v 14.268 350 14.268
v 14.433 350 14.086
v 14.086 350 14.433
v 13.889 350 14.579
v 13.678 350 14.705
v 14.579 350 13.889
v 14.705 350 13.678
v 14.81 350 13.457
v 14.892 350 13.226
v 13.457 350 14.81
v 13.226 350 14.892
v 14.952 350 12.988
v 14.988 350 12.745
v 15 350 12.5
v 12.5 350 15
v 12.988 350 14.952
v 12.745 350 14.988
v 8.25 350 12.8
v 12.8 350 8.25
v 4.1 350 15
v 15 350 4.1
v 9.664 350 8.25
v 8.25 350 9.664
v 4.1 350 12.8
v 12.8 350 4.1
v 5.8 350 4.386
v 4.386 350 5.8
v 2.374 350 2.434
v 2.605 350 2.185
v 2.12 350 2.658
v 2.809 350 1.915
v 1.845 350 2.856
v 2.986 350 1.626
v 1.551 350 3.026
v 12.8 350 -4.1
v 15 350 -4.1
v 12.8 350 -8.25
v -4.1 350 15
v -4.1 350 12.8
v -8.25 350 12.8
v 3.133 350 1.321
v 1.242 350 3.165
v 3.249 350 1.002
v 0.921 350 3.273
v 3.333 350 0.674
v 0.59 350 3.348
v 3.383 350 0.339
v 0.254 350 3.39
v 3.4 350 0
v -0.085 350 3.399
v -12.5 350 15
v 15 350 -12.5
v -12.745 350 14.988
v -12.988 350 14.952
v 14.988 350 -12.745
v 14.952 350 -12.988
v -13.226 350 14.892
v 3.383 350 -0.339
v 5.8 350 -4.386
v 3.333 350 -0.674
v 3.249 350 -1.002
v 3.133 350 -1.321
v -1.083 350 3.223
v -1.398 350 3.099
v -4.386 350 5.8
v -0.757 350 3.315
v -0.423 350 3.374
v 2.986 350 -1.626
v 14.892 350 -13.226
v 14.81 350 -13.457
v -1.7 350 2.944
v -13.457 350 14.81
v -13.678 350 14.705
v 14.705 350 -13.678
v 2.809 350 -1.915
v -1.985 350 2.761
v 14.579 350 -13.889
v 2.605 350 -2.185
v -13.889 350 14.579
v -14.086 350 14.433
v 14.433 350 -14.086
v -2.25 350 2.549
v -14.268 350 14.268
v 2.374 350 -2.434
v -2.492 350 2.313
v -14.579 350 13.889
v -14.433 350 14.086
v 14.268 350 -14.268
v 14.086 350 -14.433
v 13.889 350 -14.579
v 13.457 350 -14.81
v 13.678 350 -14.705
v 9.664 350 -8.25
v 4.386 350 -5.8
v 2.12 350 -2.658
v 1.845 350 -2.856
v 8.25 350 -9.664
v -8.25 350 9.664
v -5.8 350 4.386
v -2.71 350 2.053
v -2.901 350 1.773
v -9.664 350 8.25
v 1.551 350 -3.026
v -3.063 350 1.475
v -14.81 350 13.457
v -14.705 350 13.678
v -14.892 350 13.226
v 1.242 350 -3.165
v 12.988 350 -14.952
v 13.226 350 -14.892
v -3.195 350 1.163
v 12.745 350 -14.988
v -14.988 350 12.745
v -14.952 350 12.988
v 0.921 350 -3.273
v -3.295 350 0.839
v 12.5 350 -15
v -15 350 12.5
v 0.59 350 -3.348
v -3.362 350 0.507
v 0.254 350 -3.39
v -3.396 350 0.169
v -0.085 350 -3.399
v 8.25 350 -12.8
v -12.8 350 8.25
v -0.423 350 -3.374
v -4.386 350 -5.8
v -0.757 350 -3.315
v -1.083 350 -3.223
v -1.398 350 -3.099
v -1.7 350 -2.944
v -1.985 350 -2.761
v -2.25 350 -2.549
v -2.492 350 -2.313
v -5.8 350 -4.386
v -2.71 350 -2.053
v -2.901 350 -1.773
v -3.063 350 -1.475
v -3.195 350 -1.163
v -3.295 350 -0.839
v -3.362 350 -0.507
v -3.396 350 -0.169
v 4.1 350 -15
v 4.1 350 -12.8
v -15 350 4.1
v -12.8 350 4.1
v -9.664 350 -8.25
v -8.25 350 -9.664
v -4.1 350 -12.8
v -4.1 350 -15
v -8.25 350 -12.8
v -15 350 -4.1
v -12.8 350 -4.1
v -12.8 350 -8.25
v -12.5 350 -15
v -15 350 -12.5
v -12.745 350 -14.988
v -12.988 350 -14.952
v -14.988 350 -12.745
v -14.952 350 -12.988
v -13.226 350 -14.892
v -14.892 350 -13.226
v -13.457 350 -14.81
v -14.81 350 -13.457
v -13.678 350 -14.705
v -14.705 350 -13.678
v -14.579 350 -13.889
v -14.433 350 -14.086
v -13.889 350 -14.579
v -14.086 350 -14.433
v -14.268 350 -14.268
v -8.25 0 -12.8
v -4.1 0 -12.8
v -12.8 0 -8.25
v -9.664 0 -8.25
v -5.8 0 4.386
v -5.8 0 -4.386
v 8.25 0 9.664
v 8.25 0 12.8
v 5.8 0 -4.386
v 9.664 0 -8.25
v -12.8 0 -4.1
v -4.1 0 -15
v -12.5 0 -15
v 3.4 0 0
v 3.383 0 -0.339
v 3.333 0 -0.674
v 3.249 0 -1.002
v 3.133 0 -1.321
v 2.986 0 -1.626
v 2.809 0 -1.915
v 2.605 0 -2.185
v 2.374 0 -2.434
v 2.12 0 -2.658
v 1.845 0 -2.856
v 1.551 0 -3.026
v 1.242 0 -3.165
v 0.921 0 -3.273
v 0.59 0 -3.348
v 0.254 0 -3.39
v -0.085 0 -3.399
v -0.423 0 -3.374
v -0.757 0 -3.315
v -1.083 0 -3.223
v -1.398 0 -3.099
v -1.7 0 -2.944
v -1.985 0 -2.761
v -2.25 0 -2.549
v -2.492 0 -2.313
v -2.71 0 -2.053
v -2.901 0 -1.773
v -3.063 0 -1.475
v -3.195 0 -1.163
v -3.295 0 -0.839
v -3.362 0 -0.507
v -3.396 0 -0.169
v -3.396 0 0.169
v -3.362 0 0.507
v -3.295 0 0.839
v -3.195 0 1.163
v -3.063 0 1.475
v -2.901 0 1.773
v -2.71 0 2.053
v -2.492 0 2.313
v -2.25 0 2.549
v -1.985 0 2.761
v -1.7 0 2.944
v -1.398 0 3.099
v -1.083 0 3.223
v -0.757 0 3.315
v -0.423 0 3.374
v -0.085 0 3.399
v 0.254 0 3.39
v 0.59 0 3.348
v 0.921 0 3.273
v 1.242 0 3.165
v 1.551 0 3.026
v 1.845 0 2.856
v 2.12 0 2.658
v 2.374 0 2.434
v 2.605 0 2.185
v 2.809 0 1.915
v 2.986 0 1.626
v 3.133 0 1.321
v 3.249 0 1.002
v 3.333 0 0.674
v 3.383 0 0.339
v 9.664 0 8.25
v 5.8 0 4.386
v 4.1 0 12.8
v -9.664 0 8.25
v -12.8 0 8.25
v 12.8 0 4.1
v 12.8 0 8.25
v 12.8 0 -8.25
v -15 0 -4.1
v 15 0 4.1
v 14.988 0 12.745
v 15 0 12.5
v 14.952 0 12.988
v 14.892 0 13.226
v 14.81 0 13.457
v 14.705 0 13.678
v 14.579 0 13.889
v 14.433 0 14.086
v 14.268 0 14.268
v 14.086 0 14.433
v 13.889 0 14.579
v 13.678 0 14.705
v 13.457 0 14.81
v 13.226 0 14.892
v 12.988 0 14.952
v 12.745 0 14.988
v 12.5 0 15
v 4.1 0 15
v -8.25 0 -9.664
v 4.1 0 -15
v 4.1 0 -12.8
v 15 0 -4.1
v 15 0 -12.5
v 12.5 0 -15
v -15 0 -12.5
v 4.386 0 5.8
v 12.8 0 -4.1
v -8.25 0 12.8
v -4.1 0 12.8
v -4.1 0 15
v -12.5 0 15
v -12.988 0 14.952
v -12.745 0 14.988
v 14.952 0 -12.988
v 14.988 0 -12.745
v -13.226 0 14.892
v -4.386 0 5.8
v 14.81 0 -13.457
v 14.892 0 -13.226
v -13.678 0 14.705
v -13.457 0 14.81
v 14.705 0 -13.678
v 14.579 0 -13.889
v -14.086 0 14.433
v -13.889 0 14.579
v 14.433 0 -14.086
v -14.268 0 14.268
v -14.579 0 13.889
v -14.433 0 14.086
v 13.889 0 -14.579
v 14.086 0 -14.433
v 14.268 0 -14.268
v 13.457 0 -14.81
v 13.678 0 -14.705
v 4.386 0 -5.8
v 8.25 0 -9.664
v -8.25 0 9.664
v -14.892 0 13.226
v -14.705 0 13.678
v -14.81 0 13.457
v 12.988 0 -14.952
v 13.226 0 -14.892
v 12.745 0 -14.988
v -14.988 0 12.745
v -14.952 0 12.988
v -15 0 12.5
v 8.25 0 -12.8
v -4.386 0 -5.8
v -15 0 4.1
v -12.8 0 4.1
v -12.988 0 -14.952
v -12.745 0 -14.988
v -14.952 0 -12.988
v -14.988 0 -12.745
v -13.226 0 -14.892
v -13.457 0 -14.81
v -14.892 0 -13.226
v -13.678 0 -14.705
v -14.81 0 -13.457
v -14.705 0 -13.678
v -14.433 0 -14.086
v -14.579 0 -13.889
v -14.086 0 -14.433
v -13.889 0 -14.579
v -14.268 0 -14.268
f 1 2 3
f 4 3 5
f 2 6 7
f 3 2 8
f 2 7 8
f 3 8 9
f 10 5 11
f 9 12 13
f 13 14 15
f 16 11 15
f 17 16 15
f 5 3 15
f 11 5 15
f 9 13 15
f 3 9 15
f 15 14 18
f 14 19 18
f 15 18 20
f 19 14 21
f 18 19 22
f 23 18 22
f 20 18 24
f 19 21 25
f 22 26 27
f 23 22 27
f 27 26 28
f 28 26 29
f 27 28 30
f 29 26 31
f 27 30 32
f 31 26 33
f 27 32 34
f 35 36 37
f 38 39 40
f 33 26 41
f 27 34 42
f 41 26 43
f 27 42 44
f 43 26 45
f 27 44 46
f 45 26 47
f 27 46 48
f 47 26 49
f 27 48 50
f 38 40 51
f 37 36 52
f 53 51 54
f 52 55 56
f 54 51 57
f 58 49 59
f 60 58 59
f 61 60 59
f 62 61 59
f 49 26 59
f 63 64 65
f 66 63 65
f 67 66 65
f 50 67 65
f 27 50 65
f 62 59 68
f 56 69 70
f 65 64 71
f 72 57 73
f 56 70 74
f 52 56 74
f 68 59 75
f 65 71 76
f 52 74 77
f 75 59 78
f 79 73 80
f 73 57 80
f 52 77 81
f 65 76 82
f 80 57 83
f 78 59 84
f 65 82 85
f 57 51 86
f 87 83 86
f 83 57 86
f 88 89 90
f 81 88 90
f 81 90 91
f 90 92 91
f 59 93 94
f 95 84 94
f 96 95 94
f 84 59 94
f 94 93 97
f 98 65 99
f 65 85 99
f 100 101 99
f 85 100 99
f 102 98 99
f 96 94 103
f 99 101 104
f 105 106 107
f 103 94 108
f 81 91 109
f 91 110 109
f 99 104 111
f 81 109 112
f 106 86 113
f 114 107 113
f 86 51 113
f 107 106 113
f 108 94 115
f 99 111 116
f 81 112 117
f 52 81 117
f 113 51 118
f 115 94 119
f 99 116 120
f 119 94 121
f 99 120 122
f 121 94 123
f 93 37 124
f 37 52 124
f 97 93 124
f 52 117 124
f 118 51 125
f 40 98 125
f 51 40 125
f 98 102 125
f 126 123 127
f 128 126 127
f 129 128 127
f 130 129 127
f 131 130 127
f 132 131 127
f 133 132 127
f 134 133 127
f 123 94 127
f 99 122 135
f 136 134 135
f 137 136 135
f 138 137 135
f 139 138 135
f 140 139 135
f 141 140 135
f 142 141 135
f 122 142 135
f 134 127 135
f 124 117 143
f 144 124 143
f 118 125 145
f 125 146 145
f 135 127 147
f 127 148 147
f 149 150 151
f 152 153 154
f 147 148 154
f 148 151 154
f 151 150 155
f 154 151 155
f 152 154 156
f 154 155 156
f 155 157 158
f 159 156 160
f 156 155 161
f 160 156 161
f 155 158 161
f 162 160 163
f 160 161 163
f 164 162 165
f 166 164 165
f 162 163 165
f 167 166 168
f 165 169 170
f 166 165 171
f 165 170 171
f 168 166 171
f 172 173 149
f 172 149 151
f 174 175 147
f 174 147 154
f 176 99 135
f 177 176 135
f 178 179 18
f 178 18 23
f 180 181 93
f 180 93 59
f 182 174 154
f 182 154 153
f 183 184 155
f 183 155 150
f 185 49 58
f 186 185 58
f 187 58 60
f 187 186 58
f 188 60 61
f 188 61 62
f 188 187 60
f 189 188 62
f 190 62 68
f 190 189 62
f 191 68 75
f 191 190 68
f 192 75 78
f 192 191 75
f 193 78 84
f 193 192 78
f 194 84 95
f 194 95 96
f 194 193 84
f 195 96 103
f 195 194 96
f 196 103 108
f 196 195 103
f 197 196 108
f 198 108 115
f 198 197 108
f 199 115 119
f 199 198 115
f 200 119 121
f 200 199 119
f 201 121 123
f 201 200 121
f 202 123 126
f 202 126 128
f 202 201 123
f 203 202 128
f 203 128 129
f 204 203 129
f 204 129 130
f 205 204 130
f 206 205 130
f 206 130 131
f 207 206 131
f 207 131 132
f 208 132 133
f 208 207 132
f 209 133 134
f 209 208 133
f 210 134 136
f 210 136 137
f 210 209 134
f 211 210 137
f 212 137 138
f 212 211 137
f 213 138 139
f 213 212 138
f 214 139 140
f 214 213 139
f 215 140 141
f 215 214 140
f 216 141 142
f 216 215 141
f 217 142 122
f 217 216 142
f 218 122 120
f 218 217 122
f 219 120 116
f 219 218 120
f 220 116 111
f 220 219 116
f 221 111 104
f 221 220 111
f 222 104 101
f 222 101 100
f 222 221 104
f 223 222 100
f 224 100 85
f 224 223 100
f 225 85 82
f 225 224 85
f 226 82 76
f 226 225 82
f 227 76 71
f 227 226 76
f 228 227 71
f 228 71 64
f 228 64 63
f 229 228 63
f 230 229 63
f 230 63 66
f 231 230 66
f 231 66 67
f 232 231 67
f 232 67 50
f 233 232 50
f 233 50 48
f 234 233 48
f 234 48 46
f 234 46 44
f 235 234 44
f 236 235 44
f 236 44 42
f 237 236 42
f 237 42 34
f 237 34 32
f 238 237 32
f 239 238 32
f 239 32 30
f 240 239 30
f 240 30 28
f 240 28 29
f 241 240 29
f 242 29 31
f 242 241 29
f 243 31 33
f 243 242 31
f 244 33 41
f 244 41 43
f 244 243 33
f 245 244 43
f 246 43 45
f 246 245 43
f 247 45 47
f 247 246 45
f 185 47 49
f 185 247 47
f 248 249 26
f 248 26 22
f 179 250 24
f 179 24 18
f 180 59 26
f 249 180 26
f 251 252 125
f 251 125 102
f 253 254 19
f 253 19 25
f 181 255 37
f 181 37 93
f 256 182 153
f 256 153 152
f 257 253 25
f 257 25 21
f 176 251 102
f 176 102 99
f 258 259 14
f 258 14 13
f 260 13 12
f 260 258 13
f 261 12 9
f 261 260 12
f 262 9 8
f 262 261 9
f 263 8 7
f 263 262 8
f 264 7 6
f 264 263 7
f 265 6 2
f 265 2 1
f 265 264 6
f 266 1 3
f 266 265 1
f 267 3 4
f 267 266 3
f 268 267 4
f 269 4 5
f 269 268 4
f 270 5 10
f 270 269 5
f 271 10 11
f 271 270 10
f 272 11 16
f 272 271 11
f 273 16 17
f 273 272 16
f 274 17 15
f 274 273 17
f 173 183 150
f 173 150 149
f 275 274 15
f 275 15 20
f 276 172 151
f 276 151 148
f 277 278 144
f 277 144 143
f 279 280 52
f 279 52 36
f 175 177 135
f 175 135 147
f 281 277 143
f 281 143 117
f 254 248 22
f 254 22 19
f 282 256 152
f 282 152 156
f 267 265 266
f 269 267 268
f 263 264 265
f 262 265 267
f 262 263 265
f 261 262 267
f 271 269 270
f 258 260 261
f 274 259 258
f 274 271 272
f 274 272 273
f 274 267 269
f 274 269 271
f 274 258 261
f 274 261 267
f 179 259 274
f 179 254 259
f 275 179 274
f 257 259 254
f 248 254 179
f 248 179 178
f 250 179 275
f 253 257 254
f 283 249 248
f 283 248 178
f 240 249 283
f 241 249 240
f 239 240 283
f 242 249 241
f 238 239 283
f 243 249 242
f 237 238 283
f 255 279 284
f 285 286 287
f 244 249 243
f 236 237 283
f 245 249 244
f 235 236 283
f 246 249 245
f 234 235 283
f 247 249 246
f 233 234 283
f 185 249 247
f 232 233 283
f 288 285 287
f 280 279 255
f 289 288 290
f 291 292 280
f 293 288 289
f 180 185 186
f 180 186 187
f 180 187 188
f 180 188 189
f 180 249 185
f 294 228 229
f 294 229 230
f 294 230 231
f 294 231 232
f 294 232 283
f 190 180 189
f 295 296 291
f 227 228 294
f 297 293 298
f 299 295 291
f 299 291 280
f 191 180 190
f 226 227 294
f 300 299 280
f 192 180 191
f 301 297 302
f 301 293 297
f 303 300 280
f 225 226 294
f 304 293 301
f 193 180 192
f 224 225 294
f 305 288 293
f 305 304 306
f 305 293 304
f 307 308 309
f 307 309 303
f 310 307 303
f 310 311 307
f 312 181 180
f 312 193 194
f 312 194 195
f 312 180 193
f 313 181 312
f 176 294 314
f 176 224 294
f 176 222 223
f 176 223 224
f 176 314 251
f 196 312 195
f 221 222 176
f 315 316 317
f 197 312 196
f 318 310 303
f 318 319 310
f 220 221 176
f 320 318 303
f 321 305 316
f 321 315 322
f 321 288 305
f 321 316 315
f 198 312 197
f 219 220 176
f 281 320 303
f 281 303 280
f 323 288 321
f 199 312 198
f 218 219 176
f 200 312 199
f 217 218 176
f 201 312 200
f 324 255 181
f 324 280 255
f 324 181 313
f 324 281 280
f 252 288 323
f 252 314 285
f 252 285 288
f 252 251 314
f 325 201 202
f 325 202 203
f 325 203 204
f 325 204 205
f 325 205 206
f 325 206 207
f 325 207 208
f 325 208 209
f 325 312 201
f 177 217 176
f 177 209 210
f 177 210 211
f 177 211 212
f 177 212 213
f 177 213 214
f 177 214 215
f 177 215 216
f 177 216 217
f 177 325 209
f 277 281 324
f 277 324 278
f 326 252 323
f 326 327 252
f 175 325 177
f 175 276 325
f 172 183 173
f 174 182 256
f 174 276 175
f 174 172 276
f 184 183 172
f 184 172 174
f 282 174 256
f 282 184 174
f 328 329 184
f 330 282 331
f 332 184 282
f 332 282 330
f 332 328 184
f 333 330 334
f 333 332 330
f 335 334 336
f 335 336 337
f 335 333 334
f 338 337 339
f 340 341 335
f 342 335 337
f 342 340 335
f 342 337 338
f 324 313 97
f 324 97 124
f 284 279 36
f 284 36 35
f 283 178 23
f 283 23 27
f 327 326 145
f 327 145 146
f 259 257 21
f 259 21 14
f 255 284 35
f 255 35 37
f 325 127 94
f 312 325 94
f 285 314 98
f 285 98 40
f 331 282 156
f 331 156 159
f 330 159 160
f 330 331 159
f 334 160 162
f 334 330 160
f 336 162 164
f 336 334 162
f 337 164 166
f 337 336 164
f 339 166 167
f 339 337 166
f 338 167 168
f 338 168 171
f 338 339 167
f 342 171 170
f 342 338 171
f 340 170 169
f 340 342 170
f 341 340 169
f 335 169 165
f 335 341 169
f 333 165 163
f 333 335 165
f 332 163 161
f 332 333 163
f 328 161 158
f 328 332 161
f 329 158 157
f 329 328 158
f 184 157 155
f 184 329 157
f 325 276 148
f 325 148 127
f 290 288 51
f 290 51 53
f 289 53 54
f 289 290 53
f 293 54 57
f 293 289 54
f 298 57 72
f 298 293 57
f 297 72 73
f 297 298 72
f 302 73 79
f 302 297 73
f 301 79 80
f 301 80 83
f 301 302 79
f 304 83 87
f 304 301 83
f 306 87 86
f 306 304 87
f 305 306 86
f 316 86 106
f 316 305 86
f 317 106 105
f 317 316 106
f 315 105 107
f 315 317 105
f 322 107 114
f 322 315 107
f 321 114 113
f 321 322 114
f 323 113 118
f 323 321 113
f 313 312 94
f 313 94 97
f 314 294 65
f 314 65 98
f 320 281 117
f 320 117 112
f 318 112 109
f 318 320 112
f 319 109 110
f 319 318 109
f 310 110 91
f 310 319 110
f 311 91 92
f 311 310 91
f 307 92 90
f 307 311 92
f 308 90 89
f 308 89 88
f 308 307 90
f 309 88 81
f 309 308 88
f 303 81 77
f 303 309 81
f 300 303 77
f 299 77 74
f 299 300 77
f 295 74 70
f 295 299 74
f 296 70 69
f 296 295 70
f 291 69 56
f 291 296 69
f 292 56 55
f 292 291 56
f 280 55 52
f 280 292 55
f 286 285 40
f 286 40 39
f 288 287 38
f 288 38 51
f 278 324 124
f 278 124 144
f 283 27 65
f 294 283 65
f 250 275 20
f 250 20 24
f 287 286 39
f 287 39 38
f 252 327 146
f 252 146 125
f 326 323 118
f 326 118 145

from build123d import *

# Parameters (mm, degrees)
SKETCH1_R           = 3.4
BOSS_EXTRUDE1_DEPTH = 350


with BuildPart() as part:
    # Sketch1 → Boss-Extrude1 (new body)
    with BuildSketch(Plane(origin=(0, 0, 0), x_dir=(1, 0, 0), z_dir=(0, 1, 0))):
        with BuildLine():
            Line((5.8, 4.385786438), (5.8, -4.385786438))
            Line((5.8, -4.385786438), (9.664213562, -8.25))
            Line((9.664213562, -8.25), (12.8, -8.25))
            Line((12.8, -8.25), (12.8, -4.1))
            Line((12.8, -4.1), (15, -4.1))
            Line((15, -4.1), (15, -12.5))
            ThreePointArc((15, -12.5), (14.267766953, -14.267766953), (12.5, -15))
            Line((12.5, -15), (4.1, -15))
            Line((4.1, -15), (4.1, -12.8))
            Line((4.1, -12.8), (8.25, -12.8))
            Line((8.25, -12.8), (8.25, -9.664213562))
            Line((8.25, -9.664213562), (4.385786438, -5.8))
            Line((4.385786438, -5.8), (-4.385786438, -5.8))
            Line((-4.385786438, -5.8), (-8.25, -9.664213562))
            Line((-8.25, -9.664213562), (-8.25, -12.8))
            Line((-8.25, -12.8), (-4.1, -12.8))
            Line((-4.1, -12.8), (-4.1, -15))
            Line((-4.1, -15), (-12.5, -15))
            ThreePointArc((-12.5, -15), (-14.267766953, -14.267766953), (-15, -12.5))
            Line((-15, -12.5), (-15, -4.1))
            Line((-15, -4.1), (-12.8, -4.1))
            Line((-12.8, -4.1), (-12.8, -8.25))
            Line((-12.8, -8.25), (-9.664213562, -8.25))
            Line((-9.664213562, -8.25), (-5.8, -4.385786438))
            Line((-5.8, -4.385786438), (-5.8, 4.385786438))
            Line((-5.8, 4.385786438), (-9.664213562, 8.25))
            Line((-9.664213562, 8.25), (-12.8, 8.25))
            Line((-12.8, 8.25), (-12.8, 4.1))
            Line((-12.8, 4.1), (-15, 4.1))
            Line((-15, 4.1), (-15, 12.5))
            ThreePointArc((-15, 12.5), (-14.267766953, 14.267766953), (-12.5, 15))
            Line((-12.5, 15), (-4.1, 15))
            Line((-4.1, 15), (-4.1, 12.8))
            Line((-4.1, 12.8), (-8.25, 12.8))
            Line((-8.25, 12.8), (-8.25, 9.664213562))
            Line((-8.25, 9.664213562), (-4.385786438, 5.8))
            Line((-4.385786438, 5.8), (4.385786438, 5.8))
            Line((4.385786438, 5.8), (8.25, 9.664213562))
            Line((8.25, 9.664213562), (8.25, 12.8))
            Line((8.25, 12.8), (4.1, 12.8))
            Line((4.1, 12.8), (4.1, 15))
            Line((4.1, 15), (12.5, 15))
            ThreePointArc((12.5, 15), (14.267766953, 14.267766953), (15, 12.5))
            Line((15, 12.5), (15, 4.1))
            Line((15, 4.1), (12.8, 4.1))
            Line((12.8, 4.1), (12.8, 8.25))
            Line((12.8, 8.25), (9.664213562, 8.25))
            Line((9.664213562, 8.25), (5.8, 4.385786438))
        make_face()
        Circle(SKETCH1_R, mode=Mode.SUBTRACT)
    extrude(amount=BOSS_EXTRUDE1_DEPTH)


solid = part.part
